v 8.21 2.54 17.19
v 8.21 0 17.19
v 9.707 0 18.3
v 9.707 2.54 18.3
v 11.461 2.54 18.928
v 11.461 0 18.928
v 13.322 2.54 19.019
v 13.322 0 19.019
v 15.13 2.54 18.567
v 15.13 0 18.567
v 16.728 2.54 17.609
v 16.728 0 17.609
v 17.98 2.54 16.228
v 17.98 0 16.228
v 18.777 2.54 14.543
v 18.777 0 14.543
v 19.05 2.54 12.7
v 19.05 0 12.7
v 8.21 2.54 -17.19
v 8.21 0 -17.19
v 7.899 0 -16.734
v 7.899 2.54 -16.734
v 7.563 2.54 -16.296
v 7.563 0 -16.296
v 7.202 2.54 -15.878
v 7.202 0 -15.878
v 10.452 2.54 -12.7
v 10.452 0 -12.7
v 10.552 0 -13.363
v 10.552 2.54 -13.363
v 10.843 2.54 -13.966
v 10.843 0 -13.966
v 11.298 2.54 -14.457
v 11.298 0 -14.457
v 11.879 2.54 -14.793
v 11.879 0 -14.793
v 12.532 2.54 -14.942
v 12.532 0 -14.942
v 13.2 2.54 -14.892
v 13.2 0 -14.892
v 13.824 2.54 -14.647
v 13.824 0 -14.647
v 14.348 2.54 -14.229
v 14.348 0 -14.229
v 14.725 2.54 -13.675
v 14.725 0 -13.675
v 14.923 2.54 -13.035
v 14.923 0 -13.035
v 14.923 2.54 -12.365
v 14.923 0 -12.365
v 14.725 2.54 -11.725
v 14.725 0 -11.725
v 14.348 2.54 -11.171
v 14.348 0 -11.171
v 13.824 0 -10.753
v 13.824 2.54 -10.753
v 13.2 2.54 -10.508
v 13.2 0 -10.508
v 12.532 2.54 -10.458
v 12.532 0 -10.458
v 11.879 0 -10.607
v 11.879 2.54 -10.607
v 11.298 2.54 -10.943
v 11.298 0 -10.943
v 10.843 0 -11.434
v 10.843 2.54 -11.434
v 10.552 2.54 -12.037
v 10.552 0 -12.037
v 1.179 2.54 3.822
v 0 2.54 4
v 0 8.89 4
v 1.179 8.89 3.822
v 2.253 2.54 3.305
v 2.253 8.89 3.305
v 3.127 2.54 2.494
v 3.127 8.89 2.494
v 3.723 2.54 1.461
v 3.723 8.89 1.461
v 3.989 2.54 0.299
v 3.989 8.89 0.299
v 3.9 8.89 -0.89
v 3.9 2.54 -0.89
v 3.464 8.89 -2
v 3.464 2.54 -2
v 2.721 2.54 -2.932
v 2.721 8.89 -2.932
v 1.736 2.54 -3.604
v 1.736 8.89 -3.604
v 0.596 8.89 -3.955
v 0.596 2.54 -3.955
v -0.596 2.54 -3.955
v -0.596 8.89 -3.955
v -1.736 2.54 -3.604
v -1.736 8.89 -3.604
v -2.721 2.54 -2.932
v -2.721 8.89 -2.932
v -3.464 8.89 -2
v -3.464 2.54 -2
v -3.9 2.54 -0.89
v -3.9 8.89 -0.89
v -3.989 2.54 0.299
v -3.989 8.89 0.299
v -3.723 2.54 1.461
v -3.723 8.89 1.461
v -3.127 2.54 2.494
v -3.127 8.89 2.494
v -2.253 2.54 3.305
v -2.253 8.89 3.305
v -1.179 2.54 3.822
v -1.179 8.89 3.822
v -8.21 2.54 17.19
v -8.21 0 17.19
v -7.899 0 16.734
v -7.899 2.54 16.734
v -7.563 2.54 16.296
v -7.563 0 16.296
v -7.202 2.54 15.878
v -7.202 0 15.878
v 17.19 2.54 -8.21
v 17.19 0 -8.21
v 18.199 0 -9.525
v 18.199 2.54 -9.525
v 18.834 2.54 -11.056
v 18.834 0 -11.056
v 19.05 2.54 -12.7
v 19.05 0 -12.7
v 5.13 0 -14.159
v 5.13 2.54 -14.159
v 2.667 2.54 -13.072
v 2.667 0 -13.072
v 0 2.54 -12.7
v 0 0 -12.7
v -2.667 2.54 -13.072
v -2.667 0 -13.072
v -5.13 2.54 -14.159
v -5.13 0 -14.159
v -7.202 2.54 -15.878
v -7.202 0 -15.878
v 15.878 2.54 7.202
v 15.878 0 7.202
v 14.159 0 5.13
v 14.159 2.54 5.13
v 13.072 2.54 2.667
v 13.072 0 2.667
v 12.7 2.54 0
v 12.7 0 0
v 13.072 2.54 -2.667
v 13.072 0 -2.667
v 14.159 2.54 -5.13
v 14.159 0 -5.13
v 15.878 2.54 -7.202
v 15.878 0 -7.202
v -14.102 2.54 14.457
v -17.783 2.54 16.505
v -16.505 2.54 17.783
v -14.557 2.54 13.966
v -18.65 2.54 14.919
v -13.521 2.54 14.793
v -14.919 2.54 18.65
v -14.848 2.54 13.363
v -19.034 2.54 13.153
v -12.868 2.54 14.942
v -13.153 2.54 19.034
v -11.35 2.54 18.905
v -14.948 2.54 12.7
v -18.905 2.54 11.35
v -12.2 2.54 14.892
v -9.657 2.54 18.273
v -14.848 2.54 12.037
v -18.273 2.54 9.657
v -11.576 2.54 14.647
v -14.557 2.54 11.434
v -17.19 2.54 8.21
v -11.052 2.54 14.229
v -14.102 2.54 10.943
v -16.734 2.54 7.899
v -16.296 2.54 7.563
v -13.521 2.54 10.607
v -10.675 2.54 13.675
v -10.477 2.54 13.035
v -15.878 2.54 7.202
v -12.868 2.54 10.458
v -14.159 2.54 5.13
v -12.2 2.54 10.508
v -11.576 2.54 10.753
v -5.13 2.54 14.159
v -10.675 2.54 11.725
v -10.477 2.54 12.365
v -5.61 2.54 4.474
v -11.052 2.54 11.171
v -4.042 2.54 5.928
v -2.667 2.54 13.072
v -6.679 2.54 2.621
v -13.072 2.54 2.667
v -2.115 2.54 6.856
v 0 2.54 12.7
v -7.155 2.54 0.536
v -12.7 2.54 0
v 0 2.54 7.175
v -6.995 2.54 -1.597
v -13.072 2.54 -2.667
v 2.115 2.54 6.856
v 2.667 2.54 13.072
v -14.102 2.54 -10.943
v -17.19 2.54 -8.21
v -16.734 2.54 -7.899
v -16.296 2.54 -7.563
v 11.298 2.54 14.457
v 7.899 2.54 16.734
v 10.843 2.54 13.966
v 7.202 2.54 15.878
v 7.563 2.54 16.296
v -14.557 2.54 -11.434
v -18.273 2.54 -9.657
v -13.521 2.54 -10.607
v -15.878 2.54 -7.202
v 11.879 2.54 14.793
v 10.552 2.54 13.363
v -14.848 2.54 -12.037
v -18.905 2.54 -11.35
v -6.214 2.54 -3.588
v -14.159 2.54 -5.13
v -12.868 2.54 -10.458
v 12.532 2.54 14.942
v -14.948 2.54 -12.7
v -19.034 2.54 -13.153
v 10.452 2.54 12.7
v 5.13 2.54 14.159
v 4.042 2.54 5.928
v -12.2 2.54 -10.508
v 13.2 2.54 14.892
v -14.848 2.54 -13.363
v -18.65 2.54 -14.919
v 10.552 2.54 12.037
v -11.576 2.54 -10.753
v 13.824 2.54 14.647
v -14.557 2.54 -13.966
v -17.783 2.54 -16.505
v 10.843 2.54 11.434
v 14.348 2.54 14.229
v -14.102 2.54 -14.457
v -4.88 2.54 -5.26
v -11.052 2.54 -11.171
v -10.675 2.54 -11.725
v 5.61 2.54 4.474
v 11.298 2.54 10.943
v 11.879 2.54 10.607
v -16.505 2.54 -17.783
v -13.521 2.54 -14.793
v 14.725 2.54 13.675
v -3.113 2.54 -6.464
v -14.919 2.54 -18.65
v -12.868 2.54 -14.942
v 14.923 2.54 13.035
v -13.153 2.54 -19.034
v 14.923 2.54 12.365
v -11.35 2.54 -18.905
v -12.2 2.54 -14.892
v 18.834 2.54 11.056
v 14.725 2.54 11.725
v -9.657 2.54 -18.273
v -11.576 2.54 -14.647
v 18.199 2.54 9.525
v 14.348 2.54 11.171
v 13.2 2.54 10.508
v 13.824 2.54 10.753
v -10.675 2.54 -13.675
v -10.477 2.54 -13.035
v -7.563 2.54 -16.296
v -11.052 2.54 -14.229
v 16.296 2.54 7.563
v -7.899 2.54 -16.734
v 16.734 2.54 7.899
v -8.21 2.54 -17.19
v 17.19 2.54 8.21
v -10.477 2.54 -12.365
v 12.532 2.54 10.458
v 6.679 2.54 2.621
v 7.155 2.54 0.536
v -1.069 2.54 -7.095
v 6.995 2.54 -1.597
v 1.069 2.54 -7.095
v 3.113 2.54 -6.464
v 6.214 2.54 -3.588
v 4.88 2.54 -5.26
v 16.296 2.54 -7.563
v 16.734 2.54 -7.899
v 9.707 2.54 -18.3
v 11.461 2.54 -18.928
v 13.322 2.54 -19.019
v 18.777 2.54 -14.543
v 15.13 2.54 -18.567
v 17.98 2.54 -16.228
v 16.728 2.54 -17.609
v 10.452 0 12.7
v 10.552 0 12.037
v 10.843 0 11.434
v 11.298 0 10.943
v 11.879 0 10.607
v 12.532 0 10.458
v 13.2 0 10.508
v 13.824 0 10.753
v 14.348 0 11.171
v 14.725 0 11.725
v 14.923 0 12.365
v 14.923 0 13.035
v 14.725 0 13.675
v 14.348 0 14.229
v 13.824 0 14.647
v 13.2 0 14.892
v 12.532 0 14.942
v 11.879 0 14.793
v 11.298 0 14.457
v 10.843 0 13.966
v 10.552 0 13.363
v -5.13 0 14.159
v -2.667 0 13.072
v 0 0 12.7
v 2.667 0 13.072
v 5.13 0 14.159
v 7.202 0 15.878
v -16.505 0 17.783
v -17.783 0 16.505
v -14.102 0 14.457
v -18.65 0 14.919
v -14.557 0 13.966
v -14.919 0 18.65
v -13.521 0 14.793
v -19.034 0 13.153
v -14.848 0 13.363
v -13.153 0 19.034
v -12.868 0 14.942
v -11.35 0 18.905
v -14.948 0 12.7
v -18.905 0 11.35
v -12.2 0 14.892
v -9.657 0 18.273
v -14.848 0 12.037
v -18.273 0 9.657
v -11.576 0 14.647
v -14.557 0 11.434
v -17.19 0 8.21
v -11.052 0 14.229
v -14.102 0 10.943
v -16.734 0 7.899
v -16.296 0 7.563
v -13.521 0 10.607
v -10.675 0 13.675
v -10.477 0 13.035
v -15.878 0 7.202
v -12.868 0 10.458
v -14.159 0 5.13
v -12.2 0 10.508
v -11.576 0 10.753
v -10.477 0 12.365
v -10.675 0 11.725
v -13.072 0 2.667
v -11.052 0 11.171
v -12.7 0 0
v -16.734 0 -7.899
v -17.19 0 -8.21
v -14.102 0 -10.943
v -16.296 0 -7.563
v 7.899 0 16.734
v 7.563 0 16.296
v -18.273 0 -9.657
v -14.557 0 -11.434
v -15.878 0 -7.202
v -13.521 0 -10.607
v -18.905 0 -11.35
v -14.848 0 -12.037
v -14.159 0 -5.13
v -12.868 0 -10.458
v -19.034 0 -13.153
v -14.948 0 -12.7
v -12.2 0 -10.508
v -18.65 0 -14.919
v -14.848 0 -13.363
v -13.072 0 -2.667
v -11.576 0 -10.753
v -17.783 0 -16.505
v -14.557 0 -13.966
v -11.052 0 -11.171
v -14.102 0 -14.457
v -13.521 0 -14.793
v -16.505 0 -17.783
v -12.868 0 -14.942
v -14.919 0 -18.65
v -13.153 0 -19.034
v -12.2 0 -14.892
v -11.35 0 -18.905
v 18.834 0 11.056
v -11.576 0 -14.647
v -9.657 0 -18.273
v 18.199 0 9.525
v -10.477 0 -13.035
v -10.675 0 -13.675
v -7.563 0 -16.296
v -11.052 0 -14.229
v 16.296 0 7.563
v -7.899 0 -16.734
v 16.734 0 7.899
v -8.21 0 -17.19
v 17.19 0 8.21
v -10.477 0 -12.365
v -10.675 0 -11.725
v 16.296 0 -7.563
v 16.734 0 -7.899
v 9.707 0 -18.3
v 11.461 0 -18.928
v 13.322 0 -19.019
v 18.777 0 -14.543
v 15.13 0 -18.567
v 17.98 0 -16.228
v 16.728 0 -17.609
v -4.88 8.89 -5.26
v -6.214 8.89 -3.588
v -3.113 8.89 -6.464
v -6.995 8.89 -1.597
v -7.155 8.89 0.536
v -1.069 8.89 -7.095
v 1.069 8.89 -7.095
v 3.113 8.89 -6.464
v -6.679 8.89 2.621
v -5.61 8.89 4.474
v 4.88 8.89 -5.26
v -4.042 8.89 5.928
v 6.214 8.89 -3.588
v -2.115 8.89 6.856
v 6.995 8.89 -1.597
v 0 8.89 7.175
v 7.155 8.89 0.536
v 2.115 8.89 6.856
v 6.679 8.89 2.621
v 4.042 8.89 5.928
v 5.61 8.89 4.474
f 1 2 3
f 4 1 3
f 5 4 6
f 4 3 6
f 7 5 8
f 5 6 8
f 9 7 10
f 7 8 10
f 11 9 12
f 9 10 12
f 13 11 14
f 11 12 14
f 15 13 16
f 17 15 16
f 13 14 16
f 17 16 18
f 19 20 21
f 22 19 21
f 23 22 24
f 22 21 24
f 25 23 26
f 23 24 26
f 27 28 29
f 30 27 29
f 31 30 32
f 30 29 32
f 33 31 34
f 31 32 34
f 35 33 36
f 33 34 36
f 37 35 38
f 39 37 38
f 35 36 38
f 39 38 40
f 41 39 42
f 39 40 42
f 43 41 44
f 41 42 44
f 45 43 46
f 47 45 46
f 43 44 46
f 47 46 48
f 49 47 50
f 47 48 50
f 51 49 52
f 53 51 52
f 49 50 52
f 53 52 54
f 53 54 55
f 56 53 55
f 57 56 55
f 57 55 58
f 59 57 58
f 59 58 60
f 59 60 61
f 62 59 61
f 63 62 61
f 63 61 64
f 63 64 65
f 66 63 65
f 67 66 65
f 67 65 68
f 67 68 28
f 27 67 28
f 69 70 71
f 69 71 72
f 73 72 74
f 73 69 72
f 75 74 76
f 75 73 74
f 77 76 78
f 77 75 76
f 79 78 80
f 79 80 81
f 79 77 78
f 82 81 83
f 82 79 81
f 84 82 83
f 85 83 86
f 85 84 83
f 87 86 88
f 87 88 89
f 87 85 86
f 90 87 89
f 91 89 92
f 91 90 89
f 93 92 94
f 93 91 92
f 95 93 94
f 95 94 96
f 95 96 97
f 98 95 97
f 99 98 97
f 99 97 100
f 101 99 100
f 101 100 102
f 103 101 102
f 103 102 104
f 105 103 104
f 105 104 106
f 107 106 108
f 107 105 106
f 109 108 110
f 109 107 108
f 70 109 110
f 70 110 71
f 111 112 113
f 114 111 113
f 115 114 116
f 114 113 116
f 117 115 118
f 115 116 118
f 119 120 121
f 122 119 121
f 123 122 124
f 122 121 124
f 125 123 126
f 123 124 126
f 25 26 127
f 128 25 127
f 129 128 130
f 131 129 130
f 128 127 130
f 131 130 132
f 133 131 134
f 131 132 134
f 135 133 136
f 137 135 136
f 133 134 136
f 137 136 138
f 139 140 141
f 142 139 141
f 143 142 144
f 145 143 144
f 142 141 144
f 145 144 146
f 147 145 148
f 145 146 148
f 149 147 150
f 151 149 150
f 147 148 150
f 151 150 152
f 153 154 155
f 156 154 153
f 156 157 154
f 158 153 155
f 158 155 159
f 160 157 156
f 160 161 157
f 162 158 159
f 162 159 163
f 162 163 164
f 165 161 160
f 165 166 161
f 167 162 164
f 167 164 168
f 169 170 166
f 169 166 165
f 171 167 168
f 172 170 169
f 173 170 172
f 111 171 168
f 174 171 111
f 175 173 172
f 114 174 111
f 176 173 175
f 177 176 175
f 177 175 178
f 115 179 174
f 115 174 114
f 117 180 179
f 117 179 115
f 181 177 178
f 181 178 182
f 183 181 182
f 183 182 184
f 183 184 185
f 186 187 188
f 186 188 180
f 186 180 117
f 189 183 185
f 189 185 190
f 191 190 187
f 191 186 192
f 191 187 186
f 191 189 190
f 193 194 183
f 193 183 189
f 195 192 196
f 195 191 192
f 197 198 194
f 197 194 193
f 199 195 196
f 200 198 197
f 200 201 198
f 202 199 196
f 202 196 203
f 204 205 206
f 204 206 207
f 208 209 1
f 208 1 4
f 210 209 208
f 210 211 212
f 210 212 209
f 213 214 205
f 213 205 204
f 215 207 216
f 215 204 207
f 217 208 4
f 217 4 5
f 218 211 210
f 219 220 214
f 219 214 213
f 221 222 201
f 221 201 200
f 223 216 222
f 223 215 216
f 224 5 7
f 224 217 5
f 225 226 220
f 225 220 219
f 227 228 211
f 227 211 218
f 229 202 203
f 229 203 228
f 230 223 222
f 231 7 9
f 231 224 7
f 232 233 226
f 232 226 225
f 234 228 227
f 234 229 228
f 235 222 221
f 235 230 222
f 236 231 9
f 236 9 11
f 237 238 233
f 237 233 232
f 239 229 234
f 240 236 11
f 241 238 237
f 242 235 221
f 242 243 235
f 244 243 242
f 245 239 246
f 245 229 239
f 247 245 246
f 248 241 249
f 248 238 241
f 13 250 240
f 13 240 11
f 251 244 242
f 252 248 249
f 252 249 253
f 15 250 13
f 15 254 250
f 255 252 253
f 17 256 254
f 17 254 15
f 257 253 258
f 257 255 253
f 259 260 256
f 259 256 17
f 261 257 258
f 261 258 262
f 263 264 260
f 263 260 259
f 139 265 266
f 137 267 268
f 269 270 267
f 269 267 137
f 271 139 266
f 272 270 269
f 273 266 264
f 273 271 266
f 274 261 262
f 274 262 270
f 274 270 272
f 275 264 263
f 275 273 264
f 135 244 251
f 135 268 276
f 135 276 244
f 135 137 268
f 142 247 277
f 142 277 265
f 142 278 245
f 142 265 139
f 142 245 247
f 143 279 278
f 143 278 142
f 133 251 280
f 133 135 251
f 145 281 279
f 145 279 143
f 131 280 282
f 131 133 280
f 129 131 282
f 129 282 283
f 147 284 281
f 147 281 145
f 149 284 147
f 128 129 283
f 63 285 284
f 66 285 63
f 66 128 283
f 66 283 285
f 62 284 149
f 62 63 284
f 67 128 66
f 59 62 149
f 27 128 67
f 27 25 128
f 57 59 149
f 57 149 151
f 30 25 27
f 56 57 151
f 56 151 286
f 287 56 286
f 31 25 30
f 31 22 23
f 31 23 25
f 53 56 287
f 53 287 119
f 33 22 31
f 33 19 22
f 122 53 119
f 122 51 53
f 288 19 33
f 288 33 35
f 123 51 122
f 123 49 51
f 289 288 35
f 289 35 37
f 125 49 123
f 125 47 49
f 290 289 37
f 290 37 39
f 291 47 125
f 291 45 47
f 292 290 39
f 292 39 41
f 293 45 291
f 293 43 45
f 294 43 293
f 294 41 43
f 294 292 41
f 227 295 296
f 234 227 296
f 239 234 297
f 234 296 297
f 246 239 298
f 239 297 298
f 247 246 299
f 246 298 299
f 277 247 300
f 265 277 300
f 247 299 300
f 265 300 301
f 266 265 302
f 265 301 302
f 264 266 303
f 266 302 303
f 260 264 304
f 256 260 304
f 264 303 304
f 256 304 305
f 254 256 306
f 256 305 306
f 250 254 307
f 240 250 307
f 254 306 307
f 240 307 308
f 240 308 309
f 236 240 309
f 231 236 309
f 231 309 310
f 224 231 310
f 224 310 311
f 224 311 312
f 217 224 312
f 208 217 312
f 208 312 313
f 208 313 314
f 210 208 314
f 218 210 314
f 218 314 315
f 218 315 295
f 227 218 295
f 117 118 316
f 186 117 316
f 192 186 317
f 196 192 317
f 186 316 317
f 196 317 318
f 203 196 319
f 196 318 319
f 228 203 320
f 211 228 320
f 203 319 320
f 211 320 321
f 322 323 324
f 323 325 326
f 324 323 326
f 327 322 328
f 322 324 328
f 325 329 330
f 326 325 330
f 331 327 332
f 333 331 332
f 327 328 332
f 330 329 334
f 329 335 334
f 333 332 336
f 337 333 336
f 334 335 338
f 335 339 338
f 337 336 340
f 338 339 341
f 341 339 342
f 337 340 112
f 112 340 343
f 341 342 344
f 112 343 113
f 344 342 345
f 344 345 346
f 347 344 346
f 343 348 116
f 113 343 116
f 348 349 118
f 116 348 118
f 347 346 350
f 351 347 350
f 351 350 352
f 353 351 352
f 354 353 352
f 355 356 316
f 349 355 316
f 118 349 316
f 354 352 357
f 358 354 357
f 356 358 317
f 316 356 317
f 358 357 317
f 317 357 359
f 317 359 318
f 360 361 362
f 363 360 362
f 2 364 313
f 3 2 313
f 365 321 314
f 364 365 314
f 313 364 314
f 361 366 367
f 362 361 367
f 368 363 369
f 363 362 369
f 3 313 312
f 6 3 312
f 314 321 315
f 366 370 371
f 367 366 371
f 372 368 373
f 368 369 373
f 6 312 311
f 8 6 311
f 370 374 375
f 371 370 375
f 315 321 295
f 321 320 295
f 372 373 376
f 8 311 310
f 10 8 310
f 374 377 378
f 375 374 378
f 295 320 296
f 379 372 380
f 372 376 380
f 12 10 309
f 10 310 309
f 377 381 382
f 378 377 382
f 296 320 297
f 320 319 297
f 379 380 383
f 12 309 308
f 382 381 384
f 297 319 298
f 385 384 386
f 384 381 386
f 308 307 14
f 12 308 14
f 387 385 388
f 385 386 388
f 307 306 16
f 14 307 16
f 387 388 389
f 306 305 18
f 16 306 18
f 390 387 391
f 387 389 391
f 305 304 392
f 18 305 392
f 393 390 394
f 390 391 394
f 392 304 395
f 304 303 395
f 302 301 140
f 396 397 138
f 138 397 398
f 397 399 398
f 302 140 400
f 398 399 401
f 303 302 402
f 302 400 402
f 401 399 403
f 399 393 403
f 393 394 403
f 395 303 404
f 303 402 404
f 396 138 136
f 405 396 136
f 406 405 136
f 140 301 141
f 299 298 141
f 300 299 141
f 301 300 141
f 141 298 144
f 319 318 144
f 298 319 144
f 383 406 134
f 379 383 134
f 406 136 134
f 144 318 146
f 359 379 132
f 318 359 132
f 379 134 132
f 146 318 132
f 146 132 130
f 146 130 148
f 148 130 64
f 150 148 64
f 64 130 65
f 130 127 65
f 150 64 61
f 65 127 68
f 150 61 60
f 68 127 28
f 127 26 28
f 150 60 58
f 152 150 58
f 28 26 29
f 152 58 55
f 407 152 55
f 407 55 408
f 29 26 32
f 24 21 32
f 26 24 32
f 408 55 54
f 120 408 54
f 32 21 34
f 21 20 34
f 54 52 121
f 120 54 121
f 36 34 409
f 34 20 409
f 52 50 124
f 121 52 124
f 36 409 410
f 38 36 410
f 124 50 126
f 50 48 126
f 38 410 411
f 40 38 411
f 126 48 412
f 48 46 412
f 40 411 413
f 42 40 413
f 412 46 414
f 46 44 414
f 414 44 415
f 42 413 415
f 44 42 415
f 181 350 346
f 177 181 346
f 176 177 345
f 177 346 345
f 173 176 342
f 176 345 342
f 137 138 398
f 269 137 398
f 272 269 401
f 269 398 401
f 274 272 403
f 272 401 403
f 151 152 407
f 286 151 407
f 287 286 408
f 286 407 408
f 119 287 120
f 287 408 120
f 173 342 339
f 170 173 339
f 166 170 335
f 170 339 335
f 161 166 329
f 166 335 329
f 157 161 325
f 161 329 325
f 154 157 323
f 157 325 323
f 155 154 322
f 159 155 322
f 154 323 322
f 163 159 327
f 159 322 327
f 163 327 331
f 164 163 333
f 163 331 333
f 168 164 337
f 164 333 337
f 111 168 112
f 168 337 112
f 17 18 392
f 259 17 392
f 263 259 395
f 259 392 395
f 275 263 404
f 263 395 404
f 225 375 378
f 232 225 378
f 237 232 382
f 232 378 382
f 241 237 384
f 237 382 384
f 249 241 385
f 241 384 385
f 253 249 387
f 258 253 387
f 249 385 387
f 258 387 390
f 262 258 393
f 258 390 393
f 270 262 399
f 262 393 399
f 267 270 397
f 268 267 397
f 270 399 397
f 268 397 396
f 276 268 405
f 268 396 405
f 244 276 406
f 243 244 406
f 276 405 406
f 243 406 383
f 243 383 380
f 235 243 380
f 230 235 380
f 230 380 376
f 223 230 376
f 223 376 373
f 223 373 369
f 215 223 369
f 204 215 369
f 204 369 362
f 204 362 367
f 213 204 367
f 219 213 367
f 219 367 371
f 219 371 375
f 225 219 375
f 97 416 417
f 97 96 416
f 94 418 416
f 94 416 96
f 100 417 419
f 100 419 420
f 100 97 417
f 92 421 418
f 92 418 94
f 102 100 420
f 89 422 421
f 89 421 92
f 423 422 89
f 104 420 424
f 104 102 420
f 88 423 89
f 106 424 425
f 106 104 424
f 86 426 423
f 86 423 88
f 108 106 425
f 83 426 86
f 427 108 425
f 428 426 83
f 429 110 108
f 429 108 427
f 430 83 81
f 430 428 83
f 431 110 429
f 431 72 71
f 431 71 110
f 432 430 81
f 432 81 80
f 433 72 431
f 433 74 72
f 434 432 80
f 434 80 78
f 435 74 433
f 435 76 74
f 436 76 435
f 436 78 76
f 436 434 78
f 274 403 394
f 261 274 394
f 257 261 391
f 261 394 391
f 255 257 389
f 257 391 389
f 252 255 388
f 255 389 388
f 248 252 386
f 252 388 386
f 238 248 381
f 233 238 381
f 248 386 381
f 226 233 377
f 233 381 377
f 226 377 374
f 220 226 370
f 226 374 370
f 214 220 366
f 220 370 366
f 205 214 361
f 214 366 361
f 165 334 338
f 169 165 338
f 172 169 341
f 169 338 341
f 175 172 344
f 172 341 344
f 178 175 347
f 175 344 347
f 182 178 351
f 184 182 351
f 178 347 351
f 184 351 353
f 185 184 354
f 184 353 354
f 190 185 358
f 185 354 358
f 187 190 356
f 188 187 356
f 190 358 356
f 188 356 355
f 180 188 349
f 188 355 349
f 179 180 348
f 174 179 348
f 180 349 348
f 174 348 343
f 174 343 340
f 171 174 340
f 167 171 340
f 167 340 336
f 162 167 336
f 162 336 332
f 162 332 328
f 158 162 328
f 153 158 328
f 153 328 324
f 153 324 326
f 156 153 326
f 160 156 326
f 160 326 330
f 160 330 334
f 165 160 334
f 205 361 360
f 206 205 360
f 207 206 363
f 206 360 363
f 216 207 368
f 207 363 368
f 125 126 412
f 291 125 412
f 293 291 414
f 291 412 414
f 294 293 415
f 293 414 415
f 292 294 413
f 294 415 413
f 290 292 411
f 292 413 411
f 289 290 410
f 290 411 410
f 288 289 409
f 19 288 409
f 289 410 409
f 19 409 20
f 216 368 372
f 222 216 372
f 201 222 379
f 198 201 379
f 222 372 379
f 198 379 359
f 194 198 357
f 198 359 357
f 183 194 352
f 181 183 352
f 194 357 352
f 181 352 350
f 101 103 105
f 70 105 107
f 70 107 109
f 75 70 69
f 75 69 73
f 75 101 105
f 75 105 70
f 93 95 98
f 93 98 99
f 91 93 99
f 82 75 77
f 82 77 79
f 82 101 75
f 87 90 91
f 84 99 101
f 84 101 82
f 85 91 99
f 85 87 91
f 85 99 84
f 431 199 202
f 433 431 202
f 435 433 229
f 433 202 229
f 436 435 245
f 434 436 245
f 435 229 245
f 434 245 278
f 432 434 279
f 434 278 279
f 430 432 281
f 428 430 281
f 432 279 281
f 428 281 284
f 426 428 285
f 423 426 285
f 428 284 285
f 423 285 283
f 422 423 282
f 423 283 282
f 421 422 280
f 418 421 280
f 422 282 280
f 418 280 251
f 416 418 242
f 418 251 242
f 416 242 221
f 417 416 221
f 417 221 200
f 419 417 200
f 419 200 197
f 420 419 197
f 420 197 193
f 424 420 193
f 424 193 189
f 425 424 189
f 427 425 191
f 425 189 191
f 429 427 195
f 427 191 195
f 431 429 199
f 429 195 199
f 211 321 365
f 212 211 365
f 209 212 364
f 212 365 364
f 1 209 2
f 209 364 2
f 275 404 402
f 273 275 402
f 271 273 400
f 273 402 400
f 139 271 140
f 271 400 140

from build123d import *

# Parameters (mm, degrees)
SKETCH1_R             = 7.175
SKETCH1_R_2           = 4
BOSS_EXTRUDE1_DEPTH   = 2.54
BOSS_EXTRUDE2_START   = 2.54
SKETCH1_3_R           = 7.175
SKETCH1_3_R_2         = 4
BOSS_EXTRUDE2_DEPTH   = 6.35
F_8_CLEARANCE_HOLE1_D = 4.4958


with BuildPart() as part:
    # Sketch1 → Boss-Extrude1 (new body)
    # profile 1 of 7: a face of its own
    with BuildSketch(Plane(origin=(0, 0, 0), x_dir=(1, 0, 0), z_dir=(0, 1, 0))):
        with BuildLine():
            ThreePointArc((-6.35, -12.7), (-9.526522643, -7.199859868), (-15.878044557, -7.202497586))
            ThreePointArc((-15.878044557, -7.202497586), (-16.512685104, -7.734059372), (-17.190128061, -8.209871939))
            ThreePointArc((-17.190128061, -8.209871939), (-17.190128061, -17.190128061), (-8.209871939, -17.190128061))
            ThreePointArc((-8.209871939, -17.190128061), (-7.734059372, -16.512685104), (-7.202497586, -15.878044557))
            ThreePointArc((-7.202497586, -15.878044557), (-6.566826257, -14.345199026), (-6.35, -12.7))
        make_face()
    # profile 2 of 7: a face of its own
    with BuildSketch(Plane(origin=(0, 0, 0), x_dir=(1, 0, 0), z_dir=(0, 1, 0))):
        with BuildLine():
            ThreePointArc((7.202497586, 15.878044557), (0, 12.7), (-7.202497586, 15.878044557))
            ThreePointArc((-7.202497586, 15.878044557), (-6.566826257, 14.345199026), (-6.35, 12.7))
            ThreePointArc((-6.35, 12.7), (-9.526522643, 7.199859868), (-15.878044557, 7.202497586))
            ThreePointArc((-15.878044557, 7.202497586), (-12.7, 0), (-15.878044557, -7.202497586))
            ThreePointArc((-15.878044557, -7.202497586), (-9.526522643, -7.199859868), (-6.35, -12.7))
            ThreePointArc((-6.35, -12.7), (-6.566826257, -14.345199026), (-7.202497586, -15.878044557))
            ThreePointArc((-7.202497586, -15.878044557), (0, -12.7), (7.202497586, -15.878044557))
            ThreePointArc((7.202497586, -15.878044557), (8.209871939, -8.209871939), (15.878044557, -7.202497586))
            ThreePointArc((15.878044557, -7.202497586), (12.7, 0), (15.878044557, 7.202497586))
            ThreePointArc((15.878044557, 7.202497586), (8.209871939, 8.209871939), (7.202497586, 15.878044557))
        make_face()
        Circle(SKETCH1_R, mode=Mode.SUBTRACT)
    # profile 3 of 7: a face of its own
    with BuildSketch(Plane(origin=(0, 0, 0), x_dir=(1, 0, 0), z_dir=(0, 1, 0))):
        with BuildLine():
            ThreePointArc((17.190128061, -8.209871939), (16.512685104, -7.734059372), (15.878044557, -7.202497586))
            ThreePointArc((15.878044557, -7.202497586), (8.209871939, -8.209871939), (7.202497586, -15.878044557))
            ThreePointArc((7.202497586, -15.878044557), (7.734059372, -16.512685104), (8.209871939, -17.190128061))
            ThreePointArc((8.209871939, -17.190128061), (15.130039796, -18.566635031), (19.05, -12.7))
            ThreePointArc((19.05, -12.7), (18.566635031, -10.269960204), (17.190128061, -8.209871939))
        make_face()
    # profile 4 of 7: a face of its own
    with BuildSketch(Plane(origin=(0, 0, 0), x_dir=(1, 0, 0), z_dir=(0, 1, 0))):
        with BuildLine():
            ThreePointArc((8.209871939, 17.190128061), (7.734059372, 16.512685104), (7.202497586, 15.878044557))
            ThreePointArc((7.202497586, 15.878044557), (8.209871939, 8.209871939), (15.878044557, 7.202497586))
            ThreePointArc((15.878044557, 7.202497586), (16.512685104, 7.734059372), (17.190128061, 8.209871939))
            ThreePointArc((17.190128061, 8.209871939), (18.566635031, 10.269960204), (19.05, 12.7))
            ThreePointArc((19.05, 12.7), (15.130039796, 18.566635031), (8.209871939, 17.190128061))
        make_face()
    # profile 5 of 7: a face of its own
    with BuildSketch(Plane(origin=(0, 0, 0), x_dir=(1, 0, 0), z_dir=(0, 1, 0))):
        Circle(SKETCH1_R)
        Circle(SKETCH1_R_2, mode=Mode.SUBTRACT)
    # profile 6 of 7: a face of its own
    with BuildSketch(Plane(origin=(0, 0, 0), x_dir=(1, 0, 0), z_dir=(0, 1, 0))):
        Circle(SKETCH1_R_2)
    # profile 7 of 7: a face of its own
    with BuildSketch(Plane(origin=(0, 0, 0), x_dir=(1, 0, 0), z_dir=(0, 1, 0))):
        with BuildLine():
            ThreePointArc((-7.202497586, 15.878044557), (-7.734059372, 16.512685104), (-8.209871939, 17.190128061))
            ThreePointArc((-8.209871939, 17.190128061), (-17.190128061, 17.190128061), (-17.190128061, 8.209871939))
            ThreePointArc((-17.190128061, 8.209871939), (-16.512685104, 7.734059372), (-15.878044557, 7.202497586))
            ThreePointArc((-15.878044557, 7.202497586), (-9.526522643, 7.199859868), (-6.35, 12.7))
            ThreePointArc((-6.35, 12.7), (-6.566826257, 14.345199026), (-7.202497586, 15.878044557))
        make_face()
    extrude(amount=BOSS_EXTRUDE1_DEPTH)

    # Sketch1<3> → Boss-Extrude2 (add)
    with BuildSketch(Plane(origin=(0, 0, 0), x_dir=(1, 0, 0), z_dir=(0, 1, 0)).offset(BOSS_EXTRUDE2_START)):
        with Locations(Location((0, 0, 0), (0, 0, 270))):
            Circle(SKETCH1_3_R)
        with Locations(Location((0, 0, 0), (0, 0, 270))):
            Circle(SKETCH1_3_R_2, mode=Mode.SUBTRACT)
    extrude(amount=BOSS_EXTRUDE2_DEPTH)

    # #8 Clearance Hole1 (through all)
    with Locations(Plane(origin=(0, 2.54, 0), x_dir=(1, 0, 0), z_dir=(0, 1, 0))):
        with Locations((-12.7, 12.7), (12.7, 12.7), (12.7, -12.7), (-12.7, -12.7)):
            Hole(F_8_CLEARANCE_HOLE1_D / 2)


solid = part.part
